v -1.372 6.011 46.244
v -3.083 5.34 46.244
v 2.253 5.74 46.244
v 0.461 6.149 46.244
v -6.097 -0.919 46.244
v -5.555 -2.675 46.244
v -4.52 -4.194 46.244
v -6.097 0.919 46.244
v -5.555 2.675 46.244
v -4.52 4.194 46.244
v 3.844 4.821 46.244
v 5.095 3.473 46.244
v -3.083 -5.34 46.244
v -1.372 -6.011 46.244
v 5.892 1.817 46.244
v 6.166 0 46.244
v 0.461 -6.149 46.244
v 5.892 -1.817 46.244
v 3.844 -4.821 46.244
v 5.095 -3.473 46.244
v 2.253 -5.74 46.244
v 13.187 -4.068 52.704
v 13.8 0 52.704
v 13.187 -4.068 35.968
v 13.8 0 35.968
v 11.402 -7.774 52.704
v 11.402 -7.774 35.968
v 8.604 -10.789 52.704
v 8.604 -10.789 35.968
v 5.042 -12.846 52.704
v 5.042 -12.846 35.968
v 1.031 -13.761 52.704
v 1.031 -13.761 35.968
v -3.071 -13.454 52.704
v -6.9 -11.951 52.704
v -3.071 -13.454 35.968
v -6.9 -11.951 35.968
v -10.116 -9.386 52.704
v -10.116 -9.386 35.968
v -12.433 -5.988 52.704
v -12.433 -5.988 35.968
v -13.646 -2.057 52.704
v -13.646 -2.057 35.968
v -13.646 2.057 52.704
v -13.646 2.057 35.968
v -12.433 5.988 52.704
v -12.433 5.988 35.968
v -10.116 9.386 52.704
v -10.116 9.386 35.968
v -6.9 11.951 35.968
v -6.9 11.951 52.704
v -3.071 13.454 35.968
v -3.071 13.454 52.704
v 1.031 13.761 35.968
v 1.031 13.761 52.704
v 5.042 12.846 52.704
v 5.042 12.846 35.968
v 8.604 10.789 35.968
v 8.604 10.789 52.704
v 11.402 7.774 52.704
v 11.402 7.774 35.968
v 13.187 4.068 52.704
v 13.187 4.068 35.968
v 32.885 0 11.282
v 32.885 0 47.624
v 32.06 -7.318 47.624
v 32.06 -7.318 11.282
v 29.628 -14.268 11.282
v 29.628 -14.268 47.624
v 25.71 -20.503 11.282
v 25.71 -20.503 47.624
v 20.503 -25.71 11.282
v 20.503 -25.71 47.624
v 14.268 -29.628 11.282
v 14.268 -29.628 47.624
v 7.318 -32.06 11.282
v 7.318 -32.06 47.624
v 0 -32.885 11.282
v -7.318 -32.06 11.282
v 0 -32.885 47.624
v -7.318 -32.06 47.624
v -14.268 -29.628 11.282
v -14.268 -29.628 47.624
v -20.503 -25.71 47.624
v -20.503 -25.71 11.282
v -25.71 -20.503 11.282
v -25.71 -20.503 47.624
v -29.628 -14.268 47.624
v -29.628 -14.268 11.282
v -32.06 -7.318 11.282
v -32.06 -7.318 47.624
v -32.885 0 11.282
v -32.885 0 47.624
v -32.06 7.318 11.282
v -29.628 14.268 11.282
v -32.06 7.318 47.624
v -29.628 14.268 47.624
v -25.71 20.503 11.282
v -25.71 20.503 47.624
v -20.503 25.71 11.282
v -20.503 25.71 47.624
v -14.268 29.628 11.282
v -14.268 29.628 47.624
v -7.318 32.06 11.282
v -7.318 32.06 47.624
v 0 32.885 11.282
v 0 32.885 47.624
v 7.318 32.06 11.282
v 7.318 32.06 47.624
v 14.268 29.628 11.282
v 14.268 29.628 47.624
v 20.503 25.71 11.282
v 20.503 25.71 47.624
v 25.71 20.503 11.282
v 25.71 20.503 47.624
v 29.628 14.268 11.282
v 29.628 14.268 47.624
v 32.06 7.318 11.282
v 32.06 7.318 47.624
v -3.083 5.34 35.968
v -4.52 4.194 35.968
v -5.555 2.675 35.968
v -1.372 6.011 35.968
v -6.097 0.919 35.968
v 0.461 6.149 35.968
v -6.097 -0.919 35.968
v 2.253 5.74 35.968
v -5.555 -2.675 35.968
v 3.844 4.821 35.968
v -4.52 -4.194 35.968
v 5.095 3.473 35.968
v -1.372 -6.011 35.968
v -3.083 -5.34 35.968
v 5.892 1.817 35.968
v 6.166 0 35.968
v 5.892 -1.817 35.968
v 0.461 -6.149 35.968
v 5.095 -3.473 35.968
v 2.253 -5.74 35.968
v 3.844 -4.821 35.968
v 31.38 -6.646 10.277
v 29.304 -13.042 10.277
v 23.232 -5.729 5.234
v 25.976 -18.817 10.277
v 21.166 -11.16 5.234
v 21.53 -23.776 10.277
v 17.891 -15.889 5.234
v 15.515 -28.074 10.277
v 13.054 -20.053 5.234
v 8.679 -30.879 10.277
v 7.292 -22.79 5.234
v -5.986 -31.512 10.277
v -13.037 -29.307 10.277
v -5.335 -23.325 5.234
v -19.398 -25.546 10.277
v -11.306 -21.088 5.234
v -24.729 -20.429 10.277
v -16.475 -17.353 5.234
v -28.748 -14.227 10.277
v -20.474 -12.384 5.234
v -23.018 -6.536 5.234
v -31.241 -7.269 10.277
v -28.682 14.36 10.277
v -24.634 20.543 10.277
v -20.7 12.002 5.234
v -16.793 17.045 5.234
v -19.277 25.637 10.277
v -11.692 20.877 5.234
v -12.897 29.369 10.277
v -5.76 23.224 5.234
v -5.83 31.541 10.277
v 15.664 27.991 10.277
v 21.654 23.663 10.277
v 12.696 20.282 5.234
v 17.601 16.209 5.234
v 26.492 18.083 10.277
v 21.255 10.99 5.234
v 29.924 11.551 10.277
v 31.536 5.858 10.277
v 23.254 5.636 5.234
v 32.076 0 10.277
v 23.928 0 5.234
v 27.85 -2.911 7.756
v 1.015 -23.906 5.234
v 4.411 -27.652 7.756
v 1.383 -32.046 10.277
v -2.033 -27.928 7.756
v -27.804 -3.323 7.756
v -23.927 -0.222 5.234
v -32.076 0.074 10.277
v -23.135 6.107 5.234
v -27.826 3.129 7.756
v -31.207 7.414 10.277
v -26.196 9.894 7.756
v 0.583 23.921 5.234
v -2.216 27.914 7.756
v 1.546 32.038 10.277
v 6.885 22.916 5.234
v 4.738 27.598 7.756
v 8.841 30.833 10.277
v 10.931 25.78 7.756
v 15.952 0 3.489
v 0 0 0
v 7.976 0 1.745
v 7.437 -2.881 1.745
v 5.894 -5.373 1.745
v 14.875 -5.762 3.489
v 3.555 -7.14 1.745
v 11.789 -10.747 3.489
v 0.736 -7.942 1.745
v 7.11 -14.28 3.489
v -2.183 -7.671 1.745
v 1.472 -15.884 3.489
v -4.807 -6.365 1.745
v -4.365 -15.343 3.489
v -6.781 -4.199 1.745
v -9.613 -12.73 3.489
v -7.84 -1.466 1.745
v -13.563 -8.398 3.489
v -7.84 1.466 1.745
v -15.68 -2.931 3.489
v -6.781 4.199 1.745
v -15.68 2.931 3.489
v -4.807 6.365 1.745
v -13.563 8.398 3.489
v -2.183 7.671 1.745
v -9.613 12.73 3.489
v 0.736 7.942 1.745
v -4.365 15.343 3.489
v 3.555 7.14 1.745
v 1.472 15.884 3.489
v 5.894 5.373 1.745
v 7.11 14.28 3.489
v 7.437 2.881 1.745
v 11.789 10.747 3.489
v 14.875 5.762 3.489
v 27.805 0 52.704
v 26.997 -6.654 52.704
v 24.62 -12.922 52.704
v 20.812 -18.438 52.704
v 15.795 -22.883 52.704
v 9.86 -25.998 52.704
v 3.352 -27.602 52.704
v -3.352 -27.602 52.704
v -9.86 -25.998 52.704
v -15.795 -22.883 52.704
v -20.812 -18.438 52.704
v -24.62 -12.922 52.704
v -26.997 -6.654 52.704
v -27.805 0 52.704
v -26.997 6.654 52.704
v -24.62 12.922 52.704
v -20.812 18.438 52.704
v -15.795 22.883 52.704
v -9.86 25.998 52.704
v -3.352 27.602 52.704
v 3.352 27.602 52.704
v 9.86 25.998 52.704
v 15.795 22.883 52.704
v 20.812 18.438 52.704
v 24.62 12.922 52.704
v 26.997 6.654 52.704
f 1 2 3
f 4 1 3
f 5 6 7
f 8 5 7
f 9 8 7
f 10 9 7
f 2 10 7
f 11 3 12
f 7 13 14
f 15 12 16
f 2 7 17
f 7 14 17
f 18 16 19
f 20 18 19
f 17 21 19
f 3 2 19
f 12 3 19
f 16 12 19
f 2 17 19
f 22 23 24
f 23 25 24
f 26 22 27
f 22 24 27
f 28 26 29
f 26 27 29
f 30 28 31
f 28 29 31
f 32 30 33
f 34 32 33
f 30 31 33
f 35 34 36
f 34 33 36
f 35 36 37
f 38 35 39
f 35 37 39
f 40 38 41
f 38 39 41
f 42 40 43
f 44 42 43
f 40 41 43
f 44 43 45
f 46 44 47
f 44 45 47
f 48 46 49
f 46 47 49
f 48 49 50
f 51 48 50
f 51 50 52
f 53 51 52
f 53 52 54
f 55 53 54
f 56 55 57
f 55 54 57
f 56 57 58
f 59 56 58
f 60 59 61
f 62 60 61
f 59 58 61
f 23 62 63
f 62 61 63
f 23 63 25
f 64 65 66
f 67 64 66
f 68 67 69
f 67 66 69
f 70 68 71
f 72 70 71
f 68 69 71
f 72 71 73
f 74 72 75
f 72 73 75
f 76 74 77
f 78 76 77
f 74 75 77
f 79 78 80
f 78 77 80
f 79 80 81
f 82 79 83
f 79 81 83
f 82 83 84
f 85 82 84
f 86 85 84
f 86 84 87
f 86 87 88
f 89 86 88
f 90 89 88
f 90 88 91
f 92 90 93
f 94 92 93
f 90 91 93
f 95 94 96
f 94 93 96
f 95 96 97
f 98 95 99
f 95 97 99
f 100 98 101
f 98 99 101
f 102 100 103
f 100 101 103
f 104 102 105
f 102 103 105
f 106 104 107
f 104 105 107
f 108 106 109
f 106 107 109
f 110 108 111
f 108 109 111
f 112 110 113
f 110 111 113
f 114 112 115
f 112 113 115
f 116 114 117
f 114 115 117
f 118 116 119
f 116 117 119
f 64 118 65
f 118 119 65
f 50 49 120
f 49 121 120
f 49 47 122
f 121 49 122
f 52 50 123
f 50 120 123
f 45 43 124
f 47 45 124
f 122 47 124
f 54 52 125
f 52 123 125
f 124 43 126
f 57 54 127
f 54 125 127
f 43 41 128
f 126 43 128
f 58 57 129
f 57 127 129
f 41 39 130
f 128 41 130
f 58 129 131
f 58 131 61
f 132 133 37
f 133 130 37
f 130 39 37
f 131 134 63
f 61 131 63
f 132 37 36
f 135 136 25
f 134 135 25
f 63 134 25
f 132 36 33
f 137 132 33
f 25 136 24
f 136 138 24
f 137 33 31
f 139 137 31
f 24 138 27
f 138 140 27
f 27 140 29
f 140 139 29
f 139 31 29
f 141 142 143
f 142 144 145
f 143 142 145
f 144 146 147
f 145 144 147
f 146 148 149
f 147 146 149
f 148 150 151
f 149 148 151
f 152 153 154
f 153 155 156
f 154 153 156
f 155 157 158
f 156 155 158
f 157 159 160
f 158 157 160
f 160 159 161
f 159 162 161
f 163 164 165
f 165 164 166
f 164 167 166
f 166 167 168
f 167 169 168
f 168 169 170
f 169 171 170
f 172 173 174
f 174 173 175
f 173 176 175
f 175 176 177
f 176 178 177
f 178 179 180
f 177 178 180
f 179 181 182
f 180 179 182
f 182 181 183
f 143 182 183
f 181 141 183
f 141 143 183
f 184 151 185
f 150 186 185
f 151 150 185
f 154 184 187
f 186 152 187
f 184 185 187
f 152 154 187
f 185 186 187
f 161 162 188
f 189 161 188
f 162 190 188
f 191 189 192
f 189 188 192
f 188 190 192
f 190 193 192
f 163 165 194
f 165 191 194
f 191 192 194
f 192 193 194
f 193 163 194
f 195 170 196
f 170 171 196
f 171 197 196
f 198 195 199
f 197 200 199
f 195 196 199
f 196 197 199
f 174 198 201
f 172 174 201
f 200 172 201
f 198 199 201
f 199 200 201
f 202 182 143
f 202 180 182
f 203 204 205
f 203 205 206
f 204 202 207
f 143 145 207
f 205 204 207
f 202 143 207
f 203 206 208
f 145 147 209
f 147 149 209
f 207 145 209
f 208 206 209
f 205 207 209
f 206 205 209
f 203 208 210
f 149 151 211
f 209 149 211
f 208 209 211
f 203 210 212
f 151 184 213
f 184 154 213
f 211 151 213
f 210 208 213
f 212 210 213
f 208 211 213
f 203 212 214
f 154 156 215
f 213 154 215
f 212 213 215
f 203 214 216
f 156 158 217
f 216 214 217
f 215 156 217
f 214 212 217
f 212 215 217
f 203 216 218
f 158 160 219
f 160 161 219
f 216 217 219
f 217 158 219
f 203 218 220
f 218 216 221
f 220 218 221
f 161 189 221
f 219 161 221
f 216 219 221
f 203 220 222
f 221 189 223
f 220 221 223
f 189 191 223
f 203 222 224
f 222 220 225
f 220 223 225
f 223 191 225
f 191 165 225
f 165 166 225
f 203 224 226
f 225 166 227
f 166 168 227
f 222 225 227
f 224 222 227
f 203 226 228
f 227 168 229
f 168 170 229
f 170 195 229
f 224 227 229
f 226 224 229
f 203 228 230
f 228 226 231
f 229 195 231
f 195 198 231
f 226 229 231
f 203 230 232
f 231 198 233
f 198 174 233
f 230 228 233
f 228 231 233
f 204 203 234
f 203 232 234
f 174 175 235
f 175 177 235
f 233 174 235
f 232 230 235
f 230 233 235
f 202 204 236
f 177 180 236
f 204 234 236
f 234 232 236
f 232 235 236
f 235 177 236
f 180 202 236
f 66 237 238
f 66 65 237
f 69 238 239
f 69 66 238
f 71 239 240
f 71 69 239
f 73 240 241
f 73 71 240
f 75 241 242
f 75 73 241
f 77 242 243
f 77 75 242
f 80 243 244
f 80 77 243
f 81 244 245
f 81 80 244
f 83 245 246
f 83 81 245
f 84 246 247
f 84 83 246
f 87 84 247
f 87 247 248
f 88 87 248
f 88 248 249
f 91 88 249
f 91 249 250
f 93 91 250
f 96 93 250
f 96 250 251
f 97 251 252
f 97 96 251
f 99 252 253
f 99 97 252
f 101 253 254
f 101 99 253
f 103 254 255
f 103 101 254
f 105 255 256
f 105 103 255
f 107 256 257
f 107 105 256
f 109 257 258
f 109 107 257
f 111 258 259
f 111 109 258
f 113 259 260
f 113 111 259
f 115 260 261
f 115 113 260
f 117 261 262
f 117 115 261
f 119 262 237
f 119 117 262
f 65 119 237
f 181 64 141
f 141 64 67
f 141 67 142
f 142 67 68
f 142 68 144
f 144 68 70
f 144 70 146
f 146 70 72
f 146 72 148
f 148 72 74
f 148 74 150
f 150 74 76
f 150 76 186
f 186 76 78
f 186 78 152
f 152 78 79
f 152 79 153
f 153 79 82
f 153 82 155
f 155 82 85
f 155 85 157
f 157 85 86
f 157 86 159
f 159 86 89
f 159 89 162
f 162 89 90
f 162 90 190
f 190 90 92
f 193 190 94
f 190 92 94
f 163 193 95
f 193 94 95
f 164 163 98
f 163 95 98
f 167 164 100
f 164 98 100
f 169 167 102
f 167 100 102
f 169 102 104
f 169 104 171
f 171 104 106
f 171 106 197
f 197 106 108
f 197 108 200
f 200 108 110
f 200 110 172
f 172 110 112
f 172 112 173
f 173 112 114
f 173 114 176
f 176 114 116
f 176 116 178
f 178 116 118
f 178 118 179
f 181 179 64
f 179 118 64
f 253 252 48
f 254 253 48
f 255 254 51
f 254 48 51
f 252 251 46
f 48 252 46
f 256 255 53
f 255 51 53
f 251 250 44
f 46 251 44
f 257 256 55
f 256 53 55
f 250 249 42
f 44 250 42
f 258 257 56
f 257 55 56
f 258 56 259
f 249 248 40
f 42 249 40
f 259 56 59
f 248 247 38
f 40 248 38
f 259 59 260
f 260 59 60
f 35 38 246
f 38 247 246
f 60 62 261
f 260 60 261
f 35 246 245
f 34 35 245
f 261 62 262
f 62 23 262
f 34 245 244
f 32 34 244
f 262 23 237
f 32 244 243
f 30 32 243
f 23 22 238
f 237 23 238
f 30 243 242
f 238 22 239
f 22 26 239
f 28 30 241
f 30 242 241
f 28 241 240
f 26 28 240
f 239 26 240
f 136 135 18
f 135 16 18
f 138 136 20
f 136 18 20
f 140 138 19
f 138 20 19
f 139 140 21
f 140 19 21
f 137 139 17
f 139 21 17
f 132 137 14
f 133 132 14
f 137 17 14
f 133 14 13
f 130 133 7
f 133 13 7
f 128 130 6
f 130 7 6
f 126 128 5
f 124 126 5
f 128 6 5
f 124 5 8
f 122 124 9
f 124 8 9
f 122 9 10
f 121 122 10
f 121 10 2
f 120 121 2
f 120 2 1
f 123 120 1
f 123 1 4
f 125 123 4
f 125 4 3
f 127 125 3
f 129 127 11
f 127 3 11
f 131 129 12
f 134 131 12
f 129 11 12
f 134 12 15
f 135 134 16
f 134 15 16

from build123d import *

# Parameters (mm, degrees)
F3_SIZE = 5.08


# Not quite as in the source:
# - a fillet or chamfer that OpenCascade refuses, or shapes differently, is made with other operations: its cross-section is extruded or revolved along the edge and cut away or added


with BuildPart() as f1:
    # F0 (on Front) → F1 (revolve)
    with BuildSketch(Plane.XZ):
        Polygon((32.8848399222, 52.7038350701), (13.7998890132, 52.7038350701), (13.7998890132, 35.9677970409), (6.1659086496, 35.9677970409), (6.1659086496, 46.2443120778), (0, 46.2443120778), (0, 0), (32.8848399222, 7.1935597807), align=None)
    revolve(axis=Axis((0, 0, 23.1221560389), (0, 0, -1)))

    # F2: chamfer of 5.08 on 3 edges, made by hand

    # F2_s1 → F2_t2 (revolve, cut)
    with BuildSketch(Plane.XZ):
        Polygon((28.8904202174, 6.319780343), (32.8848399222, 11.2824323984), (32.8848399222, 7.1935597807), align=None)
    revolve(axis=Axis((0, 0, 7.1935597807), (0, 0, -1)), mode=Mode.SUBTRACT)

    # F2_s3 → F2_t4 (revolve, cut)
    with BuildSketch(Plane.XZ):
        Polygon((27.8048399222, 52.7038350701), (32.8848399222, 47.6238350701), (32.8848399222, 52.7038350701), align=None)
    revolve(axis=Axis((0, 0, 52.7038350701), (0, 0, -1)), mode=Mode.SUBTRACT)

    # F3
    f3_edges = [f1.edges().sort_by_distance(p)[0] for p in [
        (14.44521, 0, 3.15989),
        (-28.89042, 0, 6.31978),
    ]]
    chamfer(f3_edges, length=F3_SIZE)


solid = f1.part
